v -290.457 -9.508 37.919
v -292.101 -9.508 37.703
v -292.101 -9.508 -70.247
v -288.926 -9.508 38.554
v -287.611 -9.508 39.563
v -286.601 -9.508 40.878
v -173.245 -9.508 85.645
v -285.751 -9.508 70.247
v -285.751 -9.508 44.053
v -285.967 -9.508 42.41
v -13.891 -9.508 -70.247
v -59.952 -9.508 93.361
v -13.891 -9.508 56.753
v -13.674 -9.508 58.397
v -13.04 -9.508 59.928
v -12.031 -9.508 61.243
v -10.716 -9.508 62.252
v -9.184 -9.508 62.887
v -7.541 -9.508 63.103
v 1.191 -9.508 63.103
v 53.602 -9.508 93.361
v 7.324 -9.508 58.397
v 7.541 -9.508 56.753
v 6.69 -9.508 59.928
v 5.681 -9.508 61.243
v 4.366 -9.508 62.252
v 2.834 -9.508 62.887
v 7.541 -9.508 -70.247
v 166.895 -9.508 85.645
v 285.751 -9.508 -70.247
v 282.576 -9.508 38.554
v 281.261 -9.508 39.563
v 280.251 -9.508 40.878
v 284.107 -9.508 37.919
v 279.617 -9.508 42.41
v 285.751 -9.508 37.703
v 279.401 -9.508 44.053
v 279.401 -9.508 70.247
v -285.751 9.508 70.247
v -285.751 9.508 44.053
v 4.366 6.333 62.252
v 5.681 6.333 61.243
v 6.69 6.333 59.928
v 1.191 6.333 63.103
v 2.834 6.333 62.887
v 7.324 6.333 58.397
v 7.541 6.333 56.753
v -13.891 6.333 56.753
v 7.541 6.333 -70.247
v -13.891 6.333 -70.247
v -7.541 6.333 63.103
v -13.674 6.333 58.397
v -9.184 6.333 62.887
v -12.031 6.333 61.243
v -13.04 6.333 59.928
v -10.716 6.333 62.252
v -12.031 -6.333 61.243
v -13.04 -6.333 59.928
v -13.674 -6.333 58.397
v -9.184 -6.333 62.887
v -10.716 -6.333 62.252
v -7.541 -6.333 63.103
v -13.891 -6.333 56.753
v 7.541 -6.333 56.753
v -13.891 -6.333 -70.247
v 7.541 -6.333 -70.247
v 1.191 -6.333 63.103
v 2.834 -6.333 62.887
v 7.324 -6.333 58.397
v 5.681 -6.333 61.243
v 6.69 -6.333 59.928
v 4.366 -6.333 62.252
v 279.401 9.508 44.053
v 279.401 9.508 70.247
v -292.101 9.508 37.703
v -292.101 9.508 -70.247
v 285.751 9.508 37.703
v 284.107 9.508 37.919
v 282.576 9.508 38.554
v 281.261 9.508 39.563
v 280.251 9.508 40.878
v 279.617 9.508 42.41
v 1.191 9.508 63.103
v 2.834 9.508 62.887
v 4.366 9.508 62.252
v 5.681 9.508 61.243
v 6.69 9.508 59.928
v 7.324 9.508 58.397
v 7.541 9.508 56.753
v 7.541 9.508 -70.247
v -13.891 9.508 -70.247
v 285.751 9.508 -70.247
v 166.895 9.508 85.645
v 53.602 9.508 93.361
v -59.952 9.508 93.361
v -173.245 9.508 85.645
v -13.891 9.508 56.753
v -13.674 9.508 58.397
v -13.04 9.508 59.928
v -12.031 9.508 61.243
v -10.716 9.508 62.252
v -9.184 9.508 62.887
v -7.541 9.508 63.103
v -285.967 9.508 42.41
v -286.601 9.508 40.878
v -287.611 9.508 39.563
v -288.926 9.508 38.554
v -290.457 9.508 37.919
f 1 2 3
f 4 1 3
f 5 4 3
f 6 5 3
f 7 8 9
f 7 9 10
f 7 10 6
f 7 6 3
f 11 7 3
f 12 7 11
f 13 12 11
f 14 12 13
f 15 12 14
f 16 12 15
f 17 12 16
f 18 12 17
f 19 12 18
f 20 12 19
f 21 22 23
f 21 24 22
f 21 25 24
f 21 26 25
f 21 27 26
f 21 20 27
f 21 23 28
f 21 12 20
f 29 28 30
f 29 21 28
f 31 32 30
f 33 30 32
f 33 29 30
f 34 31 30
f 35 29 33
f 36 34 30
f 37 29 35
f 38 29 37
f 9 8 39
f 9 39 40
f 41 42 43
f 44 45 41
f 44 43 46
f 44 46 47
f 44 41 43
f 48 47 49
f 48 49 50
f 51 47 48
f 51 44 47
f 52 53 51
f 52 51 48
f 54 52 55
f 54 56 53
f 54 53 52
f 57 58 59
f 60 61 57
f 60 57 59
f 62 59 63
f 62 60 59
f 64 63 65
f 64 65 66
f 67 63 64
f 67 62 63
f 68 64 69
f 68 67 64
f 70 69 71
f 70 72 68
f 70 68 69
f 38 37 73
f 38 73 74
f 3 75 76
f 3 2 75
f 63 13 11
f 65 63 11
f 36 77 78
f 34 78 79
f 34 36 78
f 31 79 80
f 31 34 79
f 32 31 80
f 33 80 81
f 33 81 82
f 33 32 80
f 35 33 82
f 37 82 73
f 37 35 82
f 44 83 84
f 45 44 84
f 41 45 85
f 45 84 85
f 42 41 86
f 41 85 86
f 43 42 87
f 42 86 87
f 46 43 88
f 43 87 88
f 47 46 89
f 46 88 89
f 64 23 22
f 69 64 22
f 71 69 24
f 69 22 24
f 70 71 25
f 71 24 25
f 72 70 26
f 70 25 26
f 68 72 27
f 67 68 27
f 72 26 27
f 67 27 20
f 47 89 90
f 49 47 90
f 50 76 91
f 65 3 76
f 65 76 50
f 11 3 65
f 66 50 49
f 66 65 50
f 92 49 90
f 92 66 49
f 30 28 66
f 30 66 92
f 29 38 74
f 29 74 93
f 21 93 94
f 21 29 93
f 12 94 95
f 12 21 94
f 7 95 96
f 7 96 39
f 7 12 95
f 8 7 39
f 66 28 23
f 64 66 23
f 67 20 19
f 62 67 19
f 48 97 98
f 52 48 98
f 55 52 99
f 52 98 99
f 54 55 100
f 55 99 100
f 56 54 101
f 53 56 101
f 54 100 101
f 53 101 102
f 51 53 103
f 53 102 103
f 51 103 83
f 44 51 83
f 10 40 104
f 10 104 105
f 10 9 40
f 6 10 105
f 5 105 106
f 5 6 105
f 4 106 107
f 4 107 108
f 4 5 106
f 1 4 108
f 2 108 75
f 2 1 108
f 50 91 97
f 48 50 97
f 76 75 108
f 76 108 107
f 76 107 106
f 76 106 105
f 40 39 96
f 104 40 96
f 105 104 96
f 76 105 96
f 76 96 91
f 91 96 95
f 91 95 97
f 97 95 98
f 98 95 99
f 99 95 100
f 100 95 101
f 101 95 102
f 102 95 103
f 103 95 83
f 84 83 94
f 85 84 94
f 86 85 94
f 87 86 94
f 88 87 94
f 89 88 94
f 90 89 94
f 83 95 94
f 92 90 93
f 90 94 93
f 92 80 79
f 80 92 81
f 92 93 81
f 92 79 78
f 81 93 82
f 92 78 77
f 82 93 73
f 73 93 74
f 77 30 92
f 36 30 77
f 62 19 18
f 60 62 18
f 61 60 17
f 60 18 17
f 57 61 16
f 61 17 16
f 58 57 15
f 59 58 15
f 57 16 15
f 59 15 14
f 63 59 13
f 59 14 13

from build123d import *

# Parameters (mm, degrees)
F1_DEPTH = 9.50849
F3_DEPTH = 3.175
F5_DEPTH = 3.175


with BuildPart() as f1:
    # F0 (on Front) → F1 (new body, symmetric)
    with BuildSketch(Plane.XZ):
        with BuildLine():
            Line((-292.100635, -70.246875), (285.750635, -70.246875))
            Line((285.750635, -70.246875), (285.750635, 37.703125))
            ThreePointArc((285.750635, 37.703125), (281.2605069395, 39.5629969395), (279.400635, 44.053125))
            Line((279.400635, 44.053125), (279.400635, 70.246875))
            ThreePointArc((279.400635, 70.246875), (-3.175, 94.3266404561), (-285.750635, 70.246875))
            Line((-285.750635, 70.246875), (-285.750635, 44.053125))
            ThreePointArc((-285.750635, 44.053125), (-287.6105069395, 39.5629969395), (-292.100635, 37.703125))
            Line((-292.100635, 37.703125), (-292.100635, -70.246875))
        make_face()
    extrude(amount=F1_DEPTH, both=True)

    # F2 (on face) → F3 (cut)
    with BuildSketch(Plane.XZ.offset(9.50849)):
        with BuildLine():
            Line((1.190625, 63.103125), (-7.540625, 63.103125))
            ThreePointArc((-7.540625, 63.103125), (-12.0307530605, 61.2432530605), (-13.890625, 56.753125))
            Line((-13.890625, 56.753125), (-13.890625, -70.246875))
            Line((-13.890625, -70.246875), (7.540625, -70.246875))
            Line((7.540625, -70.246875), (7.540625, 56.753125))
            ThreePointArc((7.540625, 56.753125), (5.6807530605, 61.2432530605), (1.190625, 63.103125))
        make_face()
    extrude(amount=-F3_DEPTH, mode=Mode.SUBTRACT)

    # F4 (on face) → F5 (cut)
    with BuildSketch(Plane(origin=(0, 9.50849, 0), x_dir=(-1, 0, 0), z_dir=(0, 1, 0))):
        with BuildLine():
            Line((-7.540625, 56.753125), (-7.540625, -70.246875))
            Line((-7.540625, -70.246875), (13.890625, -70.246875))
            Line((13.890625, -70.246875), (13.890625, 56.753125))
            ThreePointArc((13.890625, 56.753125), (12.0307530605, 61.2432530605), (7.540625, 63.103125))
            Line((7.540625, 63.103125), (-1.190625, 63.103125))
            ThreePointArc((-1.190625, 63.103125), (-5.6807530605, 61.2432530605), (-7.540625, 56.753125))
        make_face()
    extrude(amount=-F5_DEPTH, mode=Mode.SUBTRACT)


solid = f1.part
